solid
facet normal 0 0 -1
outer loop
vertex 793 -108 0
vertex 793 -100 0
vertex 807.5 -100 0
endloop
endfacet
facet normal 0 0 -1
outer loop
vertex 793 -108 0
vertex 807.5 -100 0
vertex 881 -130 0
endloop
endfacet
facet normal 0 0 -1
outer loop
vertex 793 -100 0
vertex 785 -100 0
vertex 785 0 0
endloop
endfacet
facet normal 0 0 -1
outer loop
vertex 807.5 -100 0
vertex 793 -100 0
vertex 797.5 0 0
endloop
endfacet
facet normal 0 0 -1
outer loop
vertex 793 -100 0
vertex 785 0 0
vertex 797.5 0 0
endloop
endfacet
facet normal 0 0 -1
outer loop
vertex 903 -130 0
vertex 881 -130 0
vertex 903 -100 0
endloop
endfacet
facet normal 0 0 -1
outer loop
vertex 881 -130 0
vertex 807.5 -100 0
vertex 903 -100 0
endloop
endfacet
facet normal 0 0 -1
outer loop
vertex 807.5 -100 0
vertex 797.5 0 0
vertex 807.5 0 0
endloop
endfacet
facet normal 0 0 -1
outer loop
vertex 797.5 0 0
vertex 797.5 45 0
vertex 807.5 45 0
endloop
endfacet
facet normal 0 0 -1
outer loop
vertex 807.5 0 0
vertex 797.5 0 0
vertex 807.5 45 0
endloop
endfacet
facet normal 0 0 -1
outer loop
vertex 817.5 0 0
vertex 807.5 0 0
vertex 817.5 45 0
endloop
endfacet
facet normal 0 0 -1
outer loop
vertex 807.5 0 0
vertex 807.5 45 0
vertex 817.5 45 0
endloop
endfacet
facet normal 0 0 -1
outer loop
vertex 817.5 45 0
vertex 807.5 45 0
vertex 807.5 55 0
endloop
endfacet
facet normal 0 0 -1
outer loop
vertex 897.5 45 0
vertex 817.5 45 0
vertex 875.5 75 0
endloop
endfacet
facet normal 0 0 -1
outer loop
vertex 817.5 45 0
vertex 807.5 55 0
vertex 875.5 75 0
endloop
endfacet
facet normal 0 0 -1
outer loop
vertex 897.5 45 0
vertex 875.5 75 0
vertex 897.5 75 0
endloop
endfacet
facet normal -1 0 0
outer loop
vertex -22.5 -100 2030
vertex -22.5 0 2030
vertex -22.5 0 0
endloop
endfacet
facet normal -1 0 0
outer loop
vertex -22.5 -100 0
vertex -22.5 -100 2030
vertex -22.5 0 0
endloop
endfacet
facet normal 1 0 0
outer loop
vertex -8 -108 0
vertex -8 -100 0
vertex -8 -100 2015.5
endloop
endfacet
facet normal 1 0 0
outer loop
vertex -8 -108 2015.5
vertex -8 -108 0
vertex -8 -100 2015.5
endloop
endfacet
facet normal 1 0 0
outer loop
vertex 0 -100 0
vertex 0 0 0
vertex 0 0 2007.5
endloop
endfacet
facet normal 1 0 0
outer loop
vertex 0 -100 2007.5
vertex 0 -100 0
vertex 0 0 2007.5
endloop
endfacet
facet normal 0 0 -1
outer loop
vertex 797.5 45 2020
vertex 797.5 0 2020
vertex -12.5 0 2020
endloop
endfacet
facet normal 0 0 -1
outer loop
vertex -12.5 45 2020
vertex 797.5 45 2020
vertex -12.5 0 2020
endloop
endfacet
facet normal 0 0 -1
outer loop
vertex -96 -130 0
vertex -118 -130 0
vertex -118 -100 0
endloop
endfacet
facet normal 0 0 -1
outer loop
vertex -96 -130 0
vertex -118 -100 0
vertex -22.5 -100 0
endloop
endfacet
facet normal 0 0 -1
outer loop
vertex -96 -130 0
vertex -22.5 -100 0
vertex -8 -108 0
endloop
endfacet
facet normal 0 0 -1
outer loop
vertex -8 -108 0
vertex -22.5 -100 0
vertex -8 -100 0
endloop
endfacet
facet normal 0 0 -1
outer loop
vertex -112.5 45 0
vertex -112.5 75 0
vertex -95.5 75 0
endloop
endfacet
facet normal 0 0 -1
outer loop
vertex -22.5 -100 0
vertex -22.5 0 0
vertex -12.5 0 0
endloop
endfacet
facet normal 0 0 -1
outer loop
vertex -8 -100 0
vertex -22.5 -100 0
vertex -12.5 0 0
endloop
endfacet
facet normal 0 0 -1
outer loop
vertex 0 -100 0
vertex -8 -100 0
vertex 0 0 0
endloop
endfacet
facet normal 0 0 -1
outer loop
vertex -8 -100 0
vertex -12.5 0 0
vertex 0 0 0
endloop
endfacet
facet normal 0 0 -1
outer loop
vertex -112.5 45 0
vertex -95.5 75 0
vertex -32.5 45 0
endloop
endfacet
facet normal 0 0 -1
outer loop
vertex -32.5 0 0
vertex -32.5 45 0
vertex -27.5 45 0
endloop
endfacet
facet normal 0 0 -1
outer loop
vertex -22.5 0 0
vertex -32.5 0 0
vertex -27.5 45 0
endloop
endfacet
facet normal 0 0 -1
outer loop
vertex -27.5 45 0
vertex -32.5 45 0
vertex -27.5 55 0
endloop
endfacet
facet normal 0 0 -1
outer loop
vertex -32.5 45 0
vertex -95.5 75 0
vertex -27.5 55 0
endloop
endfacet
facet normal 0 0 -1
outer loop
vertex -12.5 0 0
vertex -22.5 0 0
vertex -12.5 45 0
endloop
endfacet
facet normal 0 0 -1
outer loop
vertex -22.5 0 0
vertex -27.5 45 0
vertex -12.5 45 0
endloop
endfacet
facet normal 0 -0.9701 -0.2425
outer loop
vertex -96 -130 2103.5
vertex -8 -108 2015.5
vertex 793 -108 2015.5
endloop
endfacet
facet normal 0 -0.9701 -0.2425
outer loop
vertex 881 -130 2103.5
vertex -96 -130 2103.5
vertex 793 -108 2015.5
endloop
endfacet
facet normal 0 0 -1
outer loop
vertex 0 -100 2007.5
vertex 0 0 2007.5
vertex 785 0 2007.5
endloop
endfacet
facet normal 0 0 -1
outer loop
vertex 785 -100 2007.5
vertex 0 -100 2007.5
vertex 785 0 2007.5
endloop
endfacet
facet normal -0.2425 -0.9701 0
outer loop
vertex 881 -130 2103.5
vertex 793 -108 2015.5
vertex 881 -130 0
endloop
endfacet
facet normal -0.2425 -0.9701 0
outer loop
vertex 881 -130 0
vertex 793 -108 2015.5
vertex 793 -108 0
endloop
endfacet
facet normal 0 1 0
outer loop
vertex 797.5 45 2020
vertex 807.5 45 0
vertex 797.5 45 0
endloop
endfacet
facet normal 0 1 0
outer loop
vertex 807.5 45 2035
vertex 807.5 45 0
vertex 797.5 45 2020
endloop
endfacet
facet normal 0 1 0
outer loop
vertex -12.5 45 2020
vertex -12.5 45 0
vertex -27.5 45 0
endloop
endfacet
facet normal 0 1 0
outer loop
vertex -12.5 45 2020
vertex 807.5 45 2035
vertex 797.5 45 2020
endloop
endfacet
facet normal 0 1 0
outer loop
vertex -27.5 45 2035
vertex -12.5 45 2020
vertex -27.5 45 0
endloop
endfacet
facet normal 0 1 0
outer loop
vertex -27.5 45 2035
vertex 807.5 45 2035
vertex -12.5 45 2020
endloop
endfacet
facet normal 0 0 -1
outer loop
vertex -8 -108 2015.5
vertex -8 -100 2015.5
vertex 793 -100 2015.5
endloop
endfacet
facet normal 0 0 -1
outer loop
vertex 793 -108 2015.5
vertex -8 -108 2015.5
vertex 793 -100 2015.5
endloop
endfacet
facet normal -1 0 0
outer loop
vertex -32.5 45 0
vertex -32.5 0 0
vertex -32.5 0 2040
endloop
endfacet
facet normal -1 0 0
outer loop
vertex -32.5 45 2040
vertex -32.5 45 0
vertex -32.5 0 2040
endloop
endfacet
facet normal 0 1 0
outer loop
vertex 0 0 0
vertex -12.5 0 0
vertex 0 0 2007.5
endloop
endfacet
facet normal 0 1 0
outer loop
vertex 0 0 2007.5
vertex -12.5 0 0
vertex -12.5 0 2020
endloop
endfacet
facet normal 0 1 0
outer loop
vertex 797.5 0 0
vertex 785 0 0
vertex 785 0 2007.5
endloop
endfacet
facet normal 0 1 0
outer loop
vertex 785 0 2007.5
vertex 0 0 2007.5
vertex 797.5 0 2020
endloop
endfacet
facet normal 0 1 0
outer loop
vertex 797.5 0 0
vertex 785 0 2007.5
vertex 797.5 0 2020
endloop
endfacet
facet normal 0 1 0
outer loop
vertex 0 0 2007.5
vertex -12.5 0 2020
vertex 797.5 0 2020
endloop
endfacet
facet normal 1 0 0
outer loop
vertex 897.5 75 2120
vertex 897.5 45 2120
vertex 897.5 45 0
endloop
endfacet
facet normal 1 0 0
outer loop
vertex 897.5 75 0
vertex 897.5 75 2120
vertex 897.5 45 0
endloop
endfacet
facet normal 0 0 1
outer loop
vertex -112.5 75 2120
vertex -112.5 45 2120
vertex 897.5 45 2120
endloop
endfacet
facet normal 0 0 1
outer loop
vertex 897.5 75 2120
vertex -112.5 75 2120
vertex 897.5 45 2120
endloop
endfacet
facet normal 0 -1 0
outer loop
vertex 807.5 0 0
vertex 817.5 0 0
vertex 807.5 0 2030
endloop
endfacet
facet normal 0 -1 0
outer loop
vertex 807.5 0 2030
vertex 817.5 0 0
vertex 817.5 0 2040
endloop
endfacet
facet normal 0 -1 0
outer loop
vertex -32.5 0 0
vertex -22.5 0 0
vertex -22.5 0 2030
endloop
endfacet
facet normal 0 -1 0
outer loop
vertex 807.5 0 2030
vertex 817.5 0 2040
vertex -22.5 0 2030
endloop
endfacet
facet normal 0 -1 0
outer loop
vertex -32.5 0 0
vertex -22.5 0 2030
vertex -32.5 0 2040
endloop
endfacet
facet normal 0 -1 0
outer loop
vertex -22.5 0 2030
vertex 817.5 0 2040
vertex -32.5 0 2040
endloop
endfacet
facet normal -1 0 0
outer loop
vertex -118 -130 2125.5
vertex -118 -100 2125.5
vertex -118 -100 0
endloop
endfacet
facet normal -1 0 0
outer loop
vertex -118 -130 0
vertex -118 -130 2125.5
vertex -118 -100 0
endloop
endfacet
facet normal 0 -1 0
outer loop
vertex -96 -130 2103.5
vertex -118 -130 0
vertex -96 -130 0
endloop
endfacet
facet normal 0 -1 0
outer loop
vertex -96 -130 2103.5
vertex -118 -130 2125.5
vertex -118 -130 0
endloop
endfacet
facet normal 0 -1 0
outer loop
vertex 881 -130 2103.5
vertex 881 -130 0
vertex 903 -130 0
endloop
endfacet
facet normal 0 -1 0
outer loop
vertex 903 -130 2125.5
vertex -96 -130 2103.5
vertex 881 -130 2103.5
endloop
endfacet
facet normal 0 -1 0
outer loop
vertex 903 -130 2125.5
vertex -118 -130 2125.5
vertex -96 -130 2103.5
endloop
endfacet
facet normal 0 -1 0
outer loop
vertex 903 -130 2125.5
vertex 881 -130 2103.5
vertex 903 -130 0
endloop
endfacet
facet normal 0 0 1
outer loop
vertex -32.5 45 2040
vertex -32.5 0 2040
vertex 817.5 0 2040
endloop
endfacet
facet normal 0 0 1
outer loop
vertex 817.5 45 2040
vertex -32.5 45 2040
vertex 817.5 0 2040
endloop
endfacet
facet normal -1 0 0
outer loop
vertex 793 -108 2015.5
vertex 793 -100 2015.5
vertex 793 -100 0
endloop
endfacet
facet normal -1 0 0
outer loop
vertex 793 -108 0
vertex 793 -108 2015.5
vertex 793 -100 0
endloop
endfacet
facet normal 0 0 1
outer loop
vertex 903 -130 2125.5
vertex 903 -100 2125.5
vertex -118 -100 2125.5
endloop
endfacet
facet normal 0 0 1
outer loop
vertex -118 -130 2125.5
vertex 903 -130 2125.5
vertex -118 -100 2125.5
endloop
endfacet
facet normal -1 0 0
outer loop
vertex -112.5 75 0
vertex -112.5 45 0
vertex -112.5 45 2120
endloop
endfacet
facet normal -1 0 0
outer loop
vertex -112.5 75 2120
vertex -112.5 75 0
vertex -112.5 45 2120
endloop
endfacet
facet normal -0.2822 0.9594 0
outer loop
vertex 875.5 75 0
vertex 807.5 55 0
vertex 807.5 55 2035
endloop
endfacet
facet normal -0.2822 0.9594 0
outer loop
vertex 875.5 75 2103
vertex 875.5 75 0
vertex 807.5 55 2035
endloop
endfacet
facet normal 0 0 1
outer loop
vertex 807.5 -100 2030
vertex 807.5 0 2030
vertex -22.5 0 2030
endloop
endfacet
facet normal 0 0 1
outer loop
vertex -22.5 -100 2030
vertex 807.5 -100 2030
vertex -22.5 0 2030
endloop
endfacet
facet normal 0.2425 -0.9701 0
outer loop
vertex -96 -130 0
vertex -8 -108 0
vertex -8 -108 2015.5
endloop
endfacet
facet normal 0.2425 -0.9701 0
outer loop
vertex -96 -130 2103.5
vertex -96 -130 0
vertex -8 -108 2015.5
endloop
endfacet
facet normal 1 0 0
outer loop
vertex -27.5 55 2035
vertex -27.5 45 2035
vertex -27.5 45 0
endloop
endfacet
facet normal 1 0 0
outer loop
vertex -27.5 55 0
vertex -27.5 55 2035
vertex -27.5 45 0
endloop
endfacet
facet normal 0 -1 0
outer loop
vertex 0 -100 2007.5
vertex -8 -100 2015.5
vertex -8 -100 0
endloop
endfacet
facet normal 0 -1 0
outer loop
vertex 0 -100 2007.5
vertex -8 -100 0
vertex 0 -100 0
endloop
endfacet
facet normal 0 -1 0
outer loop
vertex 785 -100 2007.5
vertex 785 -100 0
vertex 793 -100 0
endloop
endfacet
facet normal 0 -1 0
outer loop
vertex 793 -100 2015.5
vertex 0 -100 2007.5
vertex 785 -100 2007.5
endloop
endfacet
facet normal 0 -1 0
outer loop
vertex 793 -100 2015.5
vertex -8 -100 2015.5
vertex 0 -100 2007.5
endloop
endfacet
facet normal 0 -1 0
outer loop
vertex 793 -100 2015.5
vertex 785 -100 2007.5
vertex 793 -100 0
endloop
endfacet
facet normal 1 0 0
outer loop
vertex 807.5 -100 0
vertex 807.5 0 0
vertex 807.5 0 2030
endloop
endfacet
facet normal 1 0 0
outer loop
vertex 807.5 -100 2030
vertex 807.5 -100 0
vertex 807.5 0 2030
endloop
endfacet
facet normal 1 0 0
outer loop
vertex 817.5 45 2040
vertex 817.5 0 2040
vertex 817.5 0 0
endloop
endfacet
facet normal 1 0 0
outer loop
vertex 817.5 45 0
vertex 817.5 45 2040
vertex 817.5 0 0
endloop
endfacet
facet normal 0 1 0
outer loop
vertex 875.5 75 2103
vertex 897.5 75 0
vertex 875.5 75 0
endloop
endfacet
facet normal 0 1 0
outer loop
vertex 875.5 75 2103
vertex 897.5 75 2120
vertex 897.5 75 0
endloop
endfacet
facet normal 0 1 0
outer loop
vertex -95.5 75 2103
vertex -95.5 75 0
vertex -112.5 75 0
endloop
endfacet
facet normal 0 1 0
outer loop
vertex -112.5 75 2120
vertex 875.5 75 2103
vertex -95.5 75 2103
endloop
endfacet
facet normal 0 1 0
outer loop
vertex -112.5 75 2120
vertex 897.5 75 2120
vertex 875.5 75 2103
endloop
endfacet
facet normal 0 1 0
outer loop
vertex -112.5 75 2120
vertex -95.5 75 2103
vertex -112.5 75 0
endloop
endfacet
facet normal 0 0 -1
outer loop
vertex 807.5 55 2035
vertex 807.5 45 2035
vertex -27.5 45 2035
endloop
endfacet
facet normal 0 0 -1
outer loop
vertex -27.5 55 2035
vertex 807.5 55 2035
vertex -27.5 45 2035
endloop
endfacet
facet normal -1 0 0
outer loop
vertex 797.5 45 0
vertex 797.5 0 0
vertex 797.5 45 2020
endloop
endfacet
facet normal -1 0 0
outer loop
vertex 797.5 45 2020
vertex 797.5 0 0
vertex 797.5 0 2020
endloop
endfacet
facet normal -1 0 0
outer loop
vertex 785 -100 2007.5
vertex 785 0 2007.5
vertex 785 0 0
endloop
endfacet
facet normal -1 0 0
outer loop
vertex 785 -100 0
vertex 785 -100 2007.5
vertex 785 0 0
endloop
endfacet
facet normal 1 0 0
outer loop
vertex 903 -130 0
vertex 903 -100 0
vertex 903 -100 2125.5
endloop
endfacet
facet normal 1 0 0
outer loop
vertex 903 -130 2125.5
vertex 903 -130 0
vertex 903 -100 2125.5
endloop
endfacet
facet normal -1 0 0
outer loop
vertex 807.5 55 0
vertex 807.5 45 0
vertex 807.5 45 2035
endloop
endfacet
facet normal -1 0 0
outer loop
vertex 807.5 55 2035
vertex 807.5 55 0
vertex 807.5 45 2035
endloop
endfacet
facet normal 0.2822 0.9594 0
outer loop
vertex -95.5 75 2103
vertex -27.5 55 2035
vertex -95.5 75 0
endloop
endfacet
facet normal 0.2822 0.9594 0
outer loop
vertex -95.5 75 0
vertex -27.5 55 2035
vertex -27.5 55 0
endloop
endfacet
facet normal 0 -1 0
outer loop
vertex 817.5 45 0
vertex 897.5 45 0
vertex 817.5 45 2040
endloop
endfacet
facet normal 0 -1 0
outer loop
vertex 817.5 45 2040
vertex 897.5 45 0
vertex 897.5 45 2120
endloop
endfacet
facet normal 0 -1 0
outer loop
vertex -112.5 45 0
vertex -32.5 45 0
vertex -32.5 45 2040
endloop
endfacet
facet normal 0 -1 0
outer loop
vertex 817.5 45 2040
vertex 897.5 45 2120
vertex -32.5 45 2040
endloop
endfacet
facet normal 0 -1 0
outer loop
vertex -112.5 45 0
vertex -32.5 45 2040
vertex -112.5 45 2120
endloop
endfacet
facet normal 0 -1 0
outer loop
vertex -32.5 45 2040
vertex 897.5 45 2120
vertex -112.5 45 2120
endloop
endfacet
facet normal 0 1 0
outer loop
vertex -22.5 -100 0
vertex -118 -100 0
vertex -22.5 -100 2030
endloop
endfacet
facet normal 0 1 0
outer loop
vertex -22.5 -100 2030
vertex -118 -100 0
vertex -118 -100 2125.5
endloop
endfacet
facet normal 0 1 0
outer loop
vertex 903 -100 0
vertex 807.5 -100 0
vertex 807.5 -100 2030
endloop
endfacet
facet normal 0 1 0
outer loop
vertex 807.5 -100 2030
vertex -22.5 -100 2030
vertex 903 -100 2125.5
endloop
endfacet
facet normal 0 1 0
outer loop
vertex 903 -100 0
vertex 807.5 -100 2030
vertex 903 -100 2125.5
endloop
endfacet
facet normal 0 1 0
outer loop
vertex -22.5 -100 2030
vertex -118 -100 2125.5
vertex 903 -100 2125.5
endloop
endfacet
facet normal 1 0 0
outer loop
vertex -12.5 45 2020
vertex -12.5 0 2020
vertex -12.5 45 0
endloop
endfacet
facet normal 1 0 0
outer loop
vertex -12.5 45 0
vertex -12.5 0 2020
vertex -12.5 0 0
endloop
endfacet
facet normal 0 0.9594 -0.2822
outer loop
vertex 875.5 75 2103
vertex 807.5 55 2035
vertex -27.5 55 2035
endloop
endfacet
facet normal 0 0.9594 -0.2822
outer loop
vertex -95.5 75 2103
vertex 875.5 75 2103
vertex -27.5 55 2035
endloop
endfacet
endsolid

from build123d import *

# Parameters (mm, degrees)
F1_DEPTH = 100
F3_DEPTH = 45
F5_DEPTH = 30
F6_SIZE2 = 20
F6_SIZE  = 68
F8_DEPTH = 30
F9_SIZE2 = 22
F9_SIZE  = 88


with BuildPart() as f1:
    # F0 (on Front) → F1 (new body)
    with BuildSketch(Plane.XZ):
        Polygon((-22.5, 0), (0, 0), (0, 2007.5), (785, 2007.5), (785, 0), (807.5, 0), (807.5, 2030), (-22.5, 2030), align=None)
    extrude(amount=F1_DEPTH)

    # F2 (on face) → F3 (join)
    with BuildSketch(Plane(origin=(0, 0, 0), x_dir=(-1, 0, 0), z_dir=(0, 1, 0))):
        Polygon((12.5, 0), (22.5, 0), (32.5, 0), (32.5, 2040), (-817.5, 2040), (-817.5, 0), (-807.5, 0), (-797.5, 0), (-797.5, 2020), (12.5, 2020), align=None)
    extrude(amount=F3_DEPTH)

    # F4 (on face) → F5 (join)
    with BuildSketch(Plane(origin=(0, 45, 0), x_dir=(-1, 0, 0), z_dir=(0, 1, 0))):
        Polygon((-897.5, 0), (-817.5, 0), (-807.5, 0), (-807.5, 2035), (27.5, 2035), (27.5, 0), (32.5, 0), (112.5, 0), (112.5, 2120), (-897.5, 2120), align=None)
    extrude(amount=F5_DEPTH)

    # F6
    f6_edges = [f1.edges().sort_by_distance(p)[0] for p in [
        (390, 75, 2035),
        (-27.5, 75, 1017.5),
        (807.5, 75, 1017.5),
    ]]
    f6_side = f1.faces().sort_by_distance((852.5, 75, 23.482973))[0]
    chamfer(f6_edges, length=F6_SIZE, length2=F6_SIZE2, reference=f6_side)

    # F7 (on face) → F8 (join)
    with BuildSketch(Plane.XZ.offset(100)):
        Polygon((-118, 0), (-8, 0), (-8, 2015.5), (793, 2015.5), (793, 0), (903, 0), (903, 2125.5), (-118, 2125.5), align=None)
    extrude(amount=F8_DEPTH)

    # F9
    f9_edges = [f1.edges().sort_by_distance(p)[0] for p in [
        (793, -130, 1007.75),
        (392.5, -130, 2015.5),
        (-8, -130, 1007.75),
    ]]
    f9_side = f1.faces().sort_by_distance((-63, -130, 23.580058))[0]
    chamfer(f9_edges, length=F9_SIZE, length2=F9_SIZE2, reference=f9_side)


solid = f1.part
